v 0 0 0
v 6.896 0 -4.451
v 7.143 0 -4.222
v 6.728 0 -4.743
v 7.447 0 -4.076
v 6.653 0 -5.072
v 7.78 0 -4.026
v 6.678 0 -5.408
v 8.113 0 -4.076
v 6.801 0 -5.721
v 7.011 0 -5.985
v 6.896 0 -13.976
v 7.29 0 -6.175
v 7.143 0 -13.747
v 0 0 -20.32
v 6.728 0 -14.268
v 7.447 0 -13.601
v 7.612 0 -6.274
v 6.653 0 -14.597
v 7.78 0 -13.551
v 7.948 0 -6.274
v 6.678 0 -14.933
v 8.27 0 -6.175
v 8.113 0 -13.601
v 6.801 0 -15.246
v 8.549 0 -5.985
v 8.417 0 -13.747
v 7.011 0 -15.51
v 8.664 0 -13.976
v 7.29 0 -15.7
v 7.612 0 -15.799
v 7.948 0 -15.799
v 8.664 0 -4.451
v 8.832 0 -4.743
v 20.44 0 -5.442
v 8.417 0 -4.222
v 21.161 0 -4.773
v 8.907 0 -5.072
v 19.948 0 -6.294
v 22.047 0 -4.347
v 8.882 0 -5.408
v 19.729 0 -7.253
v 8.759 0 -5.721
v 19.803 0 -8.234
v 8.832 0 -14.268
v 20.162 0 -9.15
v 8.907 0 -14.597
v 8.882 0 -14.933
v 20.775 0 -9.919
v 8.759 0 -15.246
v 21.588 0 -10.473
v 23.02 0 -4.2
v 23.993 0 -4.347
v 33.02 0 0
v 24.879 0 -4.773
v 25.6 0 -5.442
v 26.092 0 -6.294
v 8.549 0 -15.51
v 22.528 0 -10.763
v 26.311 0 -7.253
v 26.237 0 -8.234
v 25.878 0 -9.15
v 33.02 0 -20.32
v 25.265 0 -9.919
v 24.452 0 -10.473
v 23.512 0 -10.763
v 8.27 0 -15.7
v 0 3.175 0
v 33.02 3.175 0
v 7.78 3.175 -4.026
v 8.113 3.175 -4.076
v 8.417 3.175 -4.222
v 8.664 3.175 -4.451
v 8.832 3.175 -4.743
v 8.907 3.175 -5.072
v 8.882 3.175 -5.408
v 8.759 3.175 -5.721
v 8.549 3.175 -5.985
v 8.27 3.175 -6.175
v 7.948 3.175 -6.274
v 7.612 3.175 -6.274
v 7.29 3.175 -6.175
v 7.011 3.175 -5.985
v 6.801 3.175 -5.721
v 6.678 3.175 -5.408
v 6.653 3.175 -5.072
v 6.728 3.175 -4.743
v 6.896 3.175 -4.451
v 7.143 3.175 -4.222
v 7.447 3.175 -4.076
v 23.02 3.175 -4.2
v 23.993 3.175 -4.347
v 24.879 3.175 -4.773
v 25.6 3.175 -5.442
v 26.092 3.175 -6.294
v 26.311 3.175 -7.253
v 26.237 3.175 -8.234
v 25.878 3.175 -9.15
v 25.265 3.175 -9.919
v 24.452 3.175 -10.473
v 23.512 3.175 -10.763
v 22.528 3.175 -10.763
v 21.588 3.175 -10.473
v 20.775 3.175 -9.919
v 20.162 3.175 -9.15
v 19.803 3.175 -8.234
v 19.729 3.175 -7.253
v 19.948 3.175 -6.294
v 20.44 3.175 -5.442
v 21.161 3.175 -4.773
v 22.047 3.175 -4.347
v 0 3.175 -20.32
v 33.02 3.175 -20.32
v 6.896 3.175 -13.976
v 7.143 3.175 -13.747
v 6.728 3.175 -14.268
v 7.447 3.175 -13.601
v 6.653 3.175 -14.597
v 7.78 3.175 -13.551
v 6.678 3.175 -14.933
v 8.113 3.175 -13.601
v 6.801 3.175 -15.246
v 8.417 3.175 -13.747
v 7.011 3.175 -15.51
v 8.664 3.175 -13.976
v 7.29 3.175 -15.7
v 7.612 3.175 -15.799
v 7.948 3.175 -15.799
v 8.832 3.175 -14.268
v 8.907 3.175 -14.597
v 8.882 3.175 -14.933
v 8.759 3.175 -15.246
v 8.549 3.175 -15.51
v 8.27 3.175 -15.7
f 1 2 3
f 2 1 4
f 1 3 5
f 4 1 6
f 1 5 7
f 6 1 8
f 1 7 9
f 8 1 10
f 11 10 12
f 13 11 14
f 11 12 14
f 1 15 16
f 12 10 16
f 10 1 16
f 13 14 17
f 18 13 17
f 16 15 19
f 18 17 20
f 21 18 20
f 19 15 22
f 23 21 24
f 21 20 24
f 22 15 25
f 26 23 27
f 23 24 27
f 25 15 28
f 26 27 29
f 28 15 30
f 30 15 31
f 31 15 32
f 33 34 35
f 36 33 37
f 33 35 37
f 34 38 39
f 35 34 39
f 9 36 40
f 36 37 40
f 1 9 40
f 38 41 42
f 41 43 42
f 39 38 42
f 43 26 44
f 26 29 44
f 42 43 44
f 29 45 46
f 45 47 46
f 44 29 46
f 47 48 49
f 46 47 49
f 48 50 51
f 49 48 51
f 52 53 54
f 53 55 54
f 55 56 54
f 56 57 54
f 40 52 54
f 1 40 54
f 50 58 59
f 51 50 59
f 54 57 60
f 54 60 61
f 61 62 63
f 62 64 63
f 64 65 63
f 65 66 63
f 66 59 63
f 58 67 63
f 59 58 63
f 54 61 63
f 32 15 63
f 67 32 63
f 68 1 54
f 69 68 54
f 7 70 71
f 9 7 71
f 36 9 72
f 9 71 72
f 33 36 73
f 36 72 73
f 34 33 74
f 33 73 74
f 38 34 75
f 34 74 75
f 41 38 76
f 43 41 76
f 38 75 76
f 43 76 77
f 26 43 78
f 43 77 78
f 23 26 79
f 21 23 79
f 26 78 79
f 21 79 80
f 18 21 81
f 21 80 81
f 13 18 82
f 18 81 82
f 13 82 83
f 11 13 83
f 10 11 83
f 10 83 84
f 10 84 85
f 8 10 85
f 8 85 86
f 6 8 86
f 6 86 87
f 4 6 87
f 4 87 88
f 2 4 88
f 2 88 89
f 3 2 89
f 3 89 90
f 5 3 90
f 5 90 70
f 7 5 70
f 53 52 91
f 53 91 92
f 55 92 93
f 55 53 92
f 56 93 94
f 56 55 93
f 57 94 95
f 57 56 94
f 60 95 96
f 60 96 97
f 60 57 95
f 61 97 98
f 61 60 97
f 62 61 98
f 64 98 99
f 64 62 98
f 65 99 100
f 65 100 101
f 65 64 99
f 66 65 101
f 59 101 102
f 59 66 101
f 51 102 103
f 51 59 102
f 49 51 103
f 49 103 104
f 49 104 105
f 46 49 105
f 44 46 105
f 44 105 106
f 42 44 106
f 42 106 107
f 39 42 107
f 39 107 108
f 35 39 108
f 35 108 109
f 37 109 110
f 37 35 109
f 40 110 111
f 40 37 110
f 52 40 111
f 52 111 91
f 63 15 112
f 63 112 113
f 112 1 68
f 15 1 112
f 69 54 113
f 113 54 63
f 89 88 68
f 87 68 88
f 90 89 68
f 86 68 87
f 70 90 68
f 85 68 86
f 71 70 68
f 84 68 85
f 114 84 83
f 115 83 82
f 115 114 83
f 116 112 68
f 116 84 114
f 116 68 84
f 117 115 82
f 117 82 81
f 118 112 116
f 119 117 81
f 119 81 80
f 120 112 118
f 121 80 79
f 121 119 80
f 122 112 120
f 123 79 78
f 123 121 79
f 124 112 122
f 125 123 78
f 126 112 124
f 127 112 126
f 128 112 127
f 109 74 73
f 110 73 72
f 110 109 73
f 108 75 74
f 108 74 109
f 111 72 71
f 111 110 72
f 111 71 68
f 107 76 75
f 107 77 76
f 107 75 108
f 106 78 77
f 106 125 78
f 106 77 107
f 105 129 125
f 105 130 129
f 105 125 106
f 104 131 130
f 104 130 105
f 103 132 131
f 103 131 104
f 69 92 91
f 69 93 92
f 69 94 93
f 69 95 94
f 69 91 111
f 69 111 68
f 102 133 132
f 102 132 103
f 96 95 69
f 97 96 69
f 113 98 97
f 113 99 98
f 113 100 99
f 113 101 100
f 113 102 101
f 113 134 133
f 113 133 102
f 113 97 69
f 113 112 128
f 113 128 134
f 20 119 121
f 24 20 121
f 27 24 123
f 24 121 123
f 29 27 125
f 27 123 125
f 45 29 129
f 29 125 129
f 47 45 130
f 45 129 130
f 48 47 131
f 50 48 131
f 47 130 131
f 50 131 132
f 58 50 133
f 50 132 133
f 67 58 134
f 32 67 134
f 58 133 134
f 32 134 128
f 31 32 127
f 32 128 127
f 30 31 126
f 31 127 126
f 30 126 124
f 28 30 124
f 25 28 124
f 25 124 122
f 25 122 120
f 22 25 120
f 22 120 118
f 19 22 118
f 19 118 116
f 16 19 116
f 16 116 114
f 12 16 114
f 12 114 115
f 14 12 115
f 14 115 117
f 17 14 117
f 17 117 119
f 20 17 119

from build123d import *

# Parameters (mm, degrees)
SKETCH1_W           = 33.02
SKETCH1_H           = 20.32
SKETCH1_R           = 3.3
BOSS_EXTRUDE1_DEPTH = 3.175
SKETCH2_R           = 1.1303
CUT_EXTRUDE1_DEPTH  = 39.901200817


with BuildPart() as part:
    # Sketch1 → Boss-Extrude1 (new body)
    with BuildSketch(Plane(origin=(0, 0, 0), x_dir=(1, 0, 0), z_dir=(0, 1, 0))):
        with Locations((16.51, 10.16)):
            Rectangle(SKETCH1_W, SKETCH1_H)
        with Locations(Location((23.02, 7.5, 0), (0, 0, 270))):
            Circle(SKETCH1_R, mode=Mode.SUBTRACT)
    extrude(amount=BOSS_EXTRUDE1_DEPTH)

    # Sketch2 → Cut-Extrude1 (cut, through all)
    with BuildSketch(Plane(origin=(0, 3.175, 0), x_dir=(1, 0, 0), z_dir=(0, 1, 0))):
        with Locations(Location((7.78, 5.1562, 0), (0, 0, 270))):
            Circle(SKETCH2_R)
        with Locations(Location((7.78, 14.6812, 0), (0, 0, 270))):
            Circle(SKETCH2_R)
    extrude(amount=-CUT_EXTRUDE1_DEPTH, mode=Mode.SUBTRACT)


solid = part.part
